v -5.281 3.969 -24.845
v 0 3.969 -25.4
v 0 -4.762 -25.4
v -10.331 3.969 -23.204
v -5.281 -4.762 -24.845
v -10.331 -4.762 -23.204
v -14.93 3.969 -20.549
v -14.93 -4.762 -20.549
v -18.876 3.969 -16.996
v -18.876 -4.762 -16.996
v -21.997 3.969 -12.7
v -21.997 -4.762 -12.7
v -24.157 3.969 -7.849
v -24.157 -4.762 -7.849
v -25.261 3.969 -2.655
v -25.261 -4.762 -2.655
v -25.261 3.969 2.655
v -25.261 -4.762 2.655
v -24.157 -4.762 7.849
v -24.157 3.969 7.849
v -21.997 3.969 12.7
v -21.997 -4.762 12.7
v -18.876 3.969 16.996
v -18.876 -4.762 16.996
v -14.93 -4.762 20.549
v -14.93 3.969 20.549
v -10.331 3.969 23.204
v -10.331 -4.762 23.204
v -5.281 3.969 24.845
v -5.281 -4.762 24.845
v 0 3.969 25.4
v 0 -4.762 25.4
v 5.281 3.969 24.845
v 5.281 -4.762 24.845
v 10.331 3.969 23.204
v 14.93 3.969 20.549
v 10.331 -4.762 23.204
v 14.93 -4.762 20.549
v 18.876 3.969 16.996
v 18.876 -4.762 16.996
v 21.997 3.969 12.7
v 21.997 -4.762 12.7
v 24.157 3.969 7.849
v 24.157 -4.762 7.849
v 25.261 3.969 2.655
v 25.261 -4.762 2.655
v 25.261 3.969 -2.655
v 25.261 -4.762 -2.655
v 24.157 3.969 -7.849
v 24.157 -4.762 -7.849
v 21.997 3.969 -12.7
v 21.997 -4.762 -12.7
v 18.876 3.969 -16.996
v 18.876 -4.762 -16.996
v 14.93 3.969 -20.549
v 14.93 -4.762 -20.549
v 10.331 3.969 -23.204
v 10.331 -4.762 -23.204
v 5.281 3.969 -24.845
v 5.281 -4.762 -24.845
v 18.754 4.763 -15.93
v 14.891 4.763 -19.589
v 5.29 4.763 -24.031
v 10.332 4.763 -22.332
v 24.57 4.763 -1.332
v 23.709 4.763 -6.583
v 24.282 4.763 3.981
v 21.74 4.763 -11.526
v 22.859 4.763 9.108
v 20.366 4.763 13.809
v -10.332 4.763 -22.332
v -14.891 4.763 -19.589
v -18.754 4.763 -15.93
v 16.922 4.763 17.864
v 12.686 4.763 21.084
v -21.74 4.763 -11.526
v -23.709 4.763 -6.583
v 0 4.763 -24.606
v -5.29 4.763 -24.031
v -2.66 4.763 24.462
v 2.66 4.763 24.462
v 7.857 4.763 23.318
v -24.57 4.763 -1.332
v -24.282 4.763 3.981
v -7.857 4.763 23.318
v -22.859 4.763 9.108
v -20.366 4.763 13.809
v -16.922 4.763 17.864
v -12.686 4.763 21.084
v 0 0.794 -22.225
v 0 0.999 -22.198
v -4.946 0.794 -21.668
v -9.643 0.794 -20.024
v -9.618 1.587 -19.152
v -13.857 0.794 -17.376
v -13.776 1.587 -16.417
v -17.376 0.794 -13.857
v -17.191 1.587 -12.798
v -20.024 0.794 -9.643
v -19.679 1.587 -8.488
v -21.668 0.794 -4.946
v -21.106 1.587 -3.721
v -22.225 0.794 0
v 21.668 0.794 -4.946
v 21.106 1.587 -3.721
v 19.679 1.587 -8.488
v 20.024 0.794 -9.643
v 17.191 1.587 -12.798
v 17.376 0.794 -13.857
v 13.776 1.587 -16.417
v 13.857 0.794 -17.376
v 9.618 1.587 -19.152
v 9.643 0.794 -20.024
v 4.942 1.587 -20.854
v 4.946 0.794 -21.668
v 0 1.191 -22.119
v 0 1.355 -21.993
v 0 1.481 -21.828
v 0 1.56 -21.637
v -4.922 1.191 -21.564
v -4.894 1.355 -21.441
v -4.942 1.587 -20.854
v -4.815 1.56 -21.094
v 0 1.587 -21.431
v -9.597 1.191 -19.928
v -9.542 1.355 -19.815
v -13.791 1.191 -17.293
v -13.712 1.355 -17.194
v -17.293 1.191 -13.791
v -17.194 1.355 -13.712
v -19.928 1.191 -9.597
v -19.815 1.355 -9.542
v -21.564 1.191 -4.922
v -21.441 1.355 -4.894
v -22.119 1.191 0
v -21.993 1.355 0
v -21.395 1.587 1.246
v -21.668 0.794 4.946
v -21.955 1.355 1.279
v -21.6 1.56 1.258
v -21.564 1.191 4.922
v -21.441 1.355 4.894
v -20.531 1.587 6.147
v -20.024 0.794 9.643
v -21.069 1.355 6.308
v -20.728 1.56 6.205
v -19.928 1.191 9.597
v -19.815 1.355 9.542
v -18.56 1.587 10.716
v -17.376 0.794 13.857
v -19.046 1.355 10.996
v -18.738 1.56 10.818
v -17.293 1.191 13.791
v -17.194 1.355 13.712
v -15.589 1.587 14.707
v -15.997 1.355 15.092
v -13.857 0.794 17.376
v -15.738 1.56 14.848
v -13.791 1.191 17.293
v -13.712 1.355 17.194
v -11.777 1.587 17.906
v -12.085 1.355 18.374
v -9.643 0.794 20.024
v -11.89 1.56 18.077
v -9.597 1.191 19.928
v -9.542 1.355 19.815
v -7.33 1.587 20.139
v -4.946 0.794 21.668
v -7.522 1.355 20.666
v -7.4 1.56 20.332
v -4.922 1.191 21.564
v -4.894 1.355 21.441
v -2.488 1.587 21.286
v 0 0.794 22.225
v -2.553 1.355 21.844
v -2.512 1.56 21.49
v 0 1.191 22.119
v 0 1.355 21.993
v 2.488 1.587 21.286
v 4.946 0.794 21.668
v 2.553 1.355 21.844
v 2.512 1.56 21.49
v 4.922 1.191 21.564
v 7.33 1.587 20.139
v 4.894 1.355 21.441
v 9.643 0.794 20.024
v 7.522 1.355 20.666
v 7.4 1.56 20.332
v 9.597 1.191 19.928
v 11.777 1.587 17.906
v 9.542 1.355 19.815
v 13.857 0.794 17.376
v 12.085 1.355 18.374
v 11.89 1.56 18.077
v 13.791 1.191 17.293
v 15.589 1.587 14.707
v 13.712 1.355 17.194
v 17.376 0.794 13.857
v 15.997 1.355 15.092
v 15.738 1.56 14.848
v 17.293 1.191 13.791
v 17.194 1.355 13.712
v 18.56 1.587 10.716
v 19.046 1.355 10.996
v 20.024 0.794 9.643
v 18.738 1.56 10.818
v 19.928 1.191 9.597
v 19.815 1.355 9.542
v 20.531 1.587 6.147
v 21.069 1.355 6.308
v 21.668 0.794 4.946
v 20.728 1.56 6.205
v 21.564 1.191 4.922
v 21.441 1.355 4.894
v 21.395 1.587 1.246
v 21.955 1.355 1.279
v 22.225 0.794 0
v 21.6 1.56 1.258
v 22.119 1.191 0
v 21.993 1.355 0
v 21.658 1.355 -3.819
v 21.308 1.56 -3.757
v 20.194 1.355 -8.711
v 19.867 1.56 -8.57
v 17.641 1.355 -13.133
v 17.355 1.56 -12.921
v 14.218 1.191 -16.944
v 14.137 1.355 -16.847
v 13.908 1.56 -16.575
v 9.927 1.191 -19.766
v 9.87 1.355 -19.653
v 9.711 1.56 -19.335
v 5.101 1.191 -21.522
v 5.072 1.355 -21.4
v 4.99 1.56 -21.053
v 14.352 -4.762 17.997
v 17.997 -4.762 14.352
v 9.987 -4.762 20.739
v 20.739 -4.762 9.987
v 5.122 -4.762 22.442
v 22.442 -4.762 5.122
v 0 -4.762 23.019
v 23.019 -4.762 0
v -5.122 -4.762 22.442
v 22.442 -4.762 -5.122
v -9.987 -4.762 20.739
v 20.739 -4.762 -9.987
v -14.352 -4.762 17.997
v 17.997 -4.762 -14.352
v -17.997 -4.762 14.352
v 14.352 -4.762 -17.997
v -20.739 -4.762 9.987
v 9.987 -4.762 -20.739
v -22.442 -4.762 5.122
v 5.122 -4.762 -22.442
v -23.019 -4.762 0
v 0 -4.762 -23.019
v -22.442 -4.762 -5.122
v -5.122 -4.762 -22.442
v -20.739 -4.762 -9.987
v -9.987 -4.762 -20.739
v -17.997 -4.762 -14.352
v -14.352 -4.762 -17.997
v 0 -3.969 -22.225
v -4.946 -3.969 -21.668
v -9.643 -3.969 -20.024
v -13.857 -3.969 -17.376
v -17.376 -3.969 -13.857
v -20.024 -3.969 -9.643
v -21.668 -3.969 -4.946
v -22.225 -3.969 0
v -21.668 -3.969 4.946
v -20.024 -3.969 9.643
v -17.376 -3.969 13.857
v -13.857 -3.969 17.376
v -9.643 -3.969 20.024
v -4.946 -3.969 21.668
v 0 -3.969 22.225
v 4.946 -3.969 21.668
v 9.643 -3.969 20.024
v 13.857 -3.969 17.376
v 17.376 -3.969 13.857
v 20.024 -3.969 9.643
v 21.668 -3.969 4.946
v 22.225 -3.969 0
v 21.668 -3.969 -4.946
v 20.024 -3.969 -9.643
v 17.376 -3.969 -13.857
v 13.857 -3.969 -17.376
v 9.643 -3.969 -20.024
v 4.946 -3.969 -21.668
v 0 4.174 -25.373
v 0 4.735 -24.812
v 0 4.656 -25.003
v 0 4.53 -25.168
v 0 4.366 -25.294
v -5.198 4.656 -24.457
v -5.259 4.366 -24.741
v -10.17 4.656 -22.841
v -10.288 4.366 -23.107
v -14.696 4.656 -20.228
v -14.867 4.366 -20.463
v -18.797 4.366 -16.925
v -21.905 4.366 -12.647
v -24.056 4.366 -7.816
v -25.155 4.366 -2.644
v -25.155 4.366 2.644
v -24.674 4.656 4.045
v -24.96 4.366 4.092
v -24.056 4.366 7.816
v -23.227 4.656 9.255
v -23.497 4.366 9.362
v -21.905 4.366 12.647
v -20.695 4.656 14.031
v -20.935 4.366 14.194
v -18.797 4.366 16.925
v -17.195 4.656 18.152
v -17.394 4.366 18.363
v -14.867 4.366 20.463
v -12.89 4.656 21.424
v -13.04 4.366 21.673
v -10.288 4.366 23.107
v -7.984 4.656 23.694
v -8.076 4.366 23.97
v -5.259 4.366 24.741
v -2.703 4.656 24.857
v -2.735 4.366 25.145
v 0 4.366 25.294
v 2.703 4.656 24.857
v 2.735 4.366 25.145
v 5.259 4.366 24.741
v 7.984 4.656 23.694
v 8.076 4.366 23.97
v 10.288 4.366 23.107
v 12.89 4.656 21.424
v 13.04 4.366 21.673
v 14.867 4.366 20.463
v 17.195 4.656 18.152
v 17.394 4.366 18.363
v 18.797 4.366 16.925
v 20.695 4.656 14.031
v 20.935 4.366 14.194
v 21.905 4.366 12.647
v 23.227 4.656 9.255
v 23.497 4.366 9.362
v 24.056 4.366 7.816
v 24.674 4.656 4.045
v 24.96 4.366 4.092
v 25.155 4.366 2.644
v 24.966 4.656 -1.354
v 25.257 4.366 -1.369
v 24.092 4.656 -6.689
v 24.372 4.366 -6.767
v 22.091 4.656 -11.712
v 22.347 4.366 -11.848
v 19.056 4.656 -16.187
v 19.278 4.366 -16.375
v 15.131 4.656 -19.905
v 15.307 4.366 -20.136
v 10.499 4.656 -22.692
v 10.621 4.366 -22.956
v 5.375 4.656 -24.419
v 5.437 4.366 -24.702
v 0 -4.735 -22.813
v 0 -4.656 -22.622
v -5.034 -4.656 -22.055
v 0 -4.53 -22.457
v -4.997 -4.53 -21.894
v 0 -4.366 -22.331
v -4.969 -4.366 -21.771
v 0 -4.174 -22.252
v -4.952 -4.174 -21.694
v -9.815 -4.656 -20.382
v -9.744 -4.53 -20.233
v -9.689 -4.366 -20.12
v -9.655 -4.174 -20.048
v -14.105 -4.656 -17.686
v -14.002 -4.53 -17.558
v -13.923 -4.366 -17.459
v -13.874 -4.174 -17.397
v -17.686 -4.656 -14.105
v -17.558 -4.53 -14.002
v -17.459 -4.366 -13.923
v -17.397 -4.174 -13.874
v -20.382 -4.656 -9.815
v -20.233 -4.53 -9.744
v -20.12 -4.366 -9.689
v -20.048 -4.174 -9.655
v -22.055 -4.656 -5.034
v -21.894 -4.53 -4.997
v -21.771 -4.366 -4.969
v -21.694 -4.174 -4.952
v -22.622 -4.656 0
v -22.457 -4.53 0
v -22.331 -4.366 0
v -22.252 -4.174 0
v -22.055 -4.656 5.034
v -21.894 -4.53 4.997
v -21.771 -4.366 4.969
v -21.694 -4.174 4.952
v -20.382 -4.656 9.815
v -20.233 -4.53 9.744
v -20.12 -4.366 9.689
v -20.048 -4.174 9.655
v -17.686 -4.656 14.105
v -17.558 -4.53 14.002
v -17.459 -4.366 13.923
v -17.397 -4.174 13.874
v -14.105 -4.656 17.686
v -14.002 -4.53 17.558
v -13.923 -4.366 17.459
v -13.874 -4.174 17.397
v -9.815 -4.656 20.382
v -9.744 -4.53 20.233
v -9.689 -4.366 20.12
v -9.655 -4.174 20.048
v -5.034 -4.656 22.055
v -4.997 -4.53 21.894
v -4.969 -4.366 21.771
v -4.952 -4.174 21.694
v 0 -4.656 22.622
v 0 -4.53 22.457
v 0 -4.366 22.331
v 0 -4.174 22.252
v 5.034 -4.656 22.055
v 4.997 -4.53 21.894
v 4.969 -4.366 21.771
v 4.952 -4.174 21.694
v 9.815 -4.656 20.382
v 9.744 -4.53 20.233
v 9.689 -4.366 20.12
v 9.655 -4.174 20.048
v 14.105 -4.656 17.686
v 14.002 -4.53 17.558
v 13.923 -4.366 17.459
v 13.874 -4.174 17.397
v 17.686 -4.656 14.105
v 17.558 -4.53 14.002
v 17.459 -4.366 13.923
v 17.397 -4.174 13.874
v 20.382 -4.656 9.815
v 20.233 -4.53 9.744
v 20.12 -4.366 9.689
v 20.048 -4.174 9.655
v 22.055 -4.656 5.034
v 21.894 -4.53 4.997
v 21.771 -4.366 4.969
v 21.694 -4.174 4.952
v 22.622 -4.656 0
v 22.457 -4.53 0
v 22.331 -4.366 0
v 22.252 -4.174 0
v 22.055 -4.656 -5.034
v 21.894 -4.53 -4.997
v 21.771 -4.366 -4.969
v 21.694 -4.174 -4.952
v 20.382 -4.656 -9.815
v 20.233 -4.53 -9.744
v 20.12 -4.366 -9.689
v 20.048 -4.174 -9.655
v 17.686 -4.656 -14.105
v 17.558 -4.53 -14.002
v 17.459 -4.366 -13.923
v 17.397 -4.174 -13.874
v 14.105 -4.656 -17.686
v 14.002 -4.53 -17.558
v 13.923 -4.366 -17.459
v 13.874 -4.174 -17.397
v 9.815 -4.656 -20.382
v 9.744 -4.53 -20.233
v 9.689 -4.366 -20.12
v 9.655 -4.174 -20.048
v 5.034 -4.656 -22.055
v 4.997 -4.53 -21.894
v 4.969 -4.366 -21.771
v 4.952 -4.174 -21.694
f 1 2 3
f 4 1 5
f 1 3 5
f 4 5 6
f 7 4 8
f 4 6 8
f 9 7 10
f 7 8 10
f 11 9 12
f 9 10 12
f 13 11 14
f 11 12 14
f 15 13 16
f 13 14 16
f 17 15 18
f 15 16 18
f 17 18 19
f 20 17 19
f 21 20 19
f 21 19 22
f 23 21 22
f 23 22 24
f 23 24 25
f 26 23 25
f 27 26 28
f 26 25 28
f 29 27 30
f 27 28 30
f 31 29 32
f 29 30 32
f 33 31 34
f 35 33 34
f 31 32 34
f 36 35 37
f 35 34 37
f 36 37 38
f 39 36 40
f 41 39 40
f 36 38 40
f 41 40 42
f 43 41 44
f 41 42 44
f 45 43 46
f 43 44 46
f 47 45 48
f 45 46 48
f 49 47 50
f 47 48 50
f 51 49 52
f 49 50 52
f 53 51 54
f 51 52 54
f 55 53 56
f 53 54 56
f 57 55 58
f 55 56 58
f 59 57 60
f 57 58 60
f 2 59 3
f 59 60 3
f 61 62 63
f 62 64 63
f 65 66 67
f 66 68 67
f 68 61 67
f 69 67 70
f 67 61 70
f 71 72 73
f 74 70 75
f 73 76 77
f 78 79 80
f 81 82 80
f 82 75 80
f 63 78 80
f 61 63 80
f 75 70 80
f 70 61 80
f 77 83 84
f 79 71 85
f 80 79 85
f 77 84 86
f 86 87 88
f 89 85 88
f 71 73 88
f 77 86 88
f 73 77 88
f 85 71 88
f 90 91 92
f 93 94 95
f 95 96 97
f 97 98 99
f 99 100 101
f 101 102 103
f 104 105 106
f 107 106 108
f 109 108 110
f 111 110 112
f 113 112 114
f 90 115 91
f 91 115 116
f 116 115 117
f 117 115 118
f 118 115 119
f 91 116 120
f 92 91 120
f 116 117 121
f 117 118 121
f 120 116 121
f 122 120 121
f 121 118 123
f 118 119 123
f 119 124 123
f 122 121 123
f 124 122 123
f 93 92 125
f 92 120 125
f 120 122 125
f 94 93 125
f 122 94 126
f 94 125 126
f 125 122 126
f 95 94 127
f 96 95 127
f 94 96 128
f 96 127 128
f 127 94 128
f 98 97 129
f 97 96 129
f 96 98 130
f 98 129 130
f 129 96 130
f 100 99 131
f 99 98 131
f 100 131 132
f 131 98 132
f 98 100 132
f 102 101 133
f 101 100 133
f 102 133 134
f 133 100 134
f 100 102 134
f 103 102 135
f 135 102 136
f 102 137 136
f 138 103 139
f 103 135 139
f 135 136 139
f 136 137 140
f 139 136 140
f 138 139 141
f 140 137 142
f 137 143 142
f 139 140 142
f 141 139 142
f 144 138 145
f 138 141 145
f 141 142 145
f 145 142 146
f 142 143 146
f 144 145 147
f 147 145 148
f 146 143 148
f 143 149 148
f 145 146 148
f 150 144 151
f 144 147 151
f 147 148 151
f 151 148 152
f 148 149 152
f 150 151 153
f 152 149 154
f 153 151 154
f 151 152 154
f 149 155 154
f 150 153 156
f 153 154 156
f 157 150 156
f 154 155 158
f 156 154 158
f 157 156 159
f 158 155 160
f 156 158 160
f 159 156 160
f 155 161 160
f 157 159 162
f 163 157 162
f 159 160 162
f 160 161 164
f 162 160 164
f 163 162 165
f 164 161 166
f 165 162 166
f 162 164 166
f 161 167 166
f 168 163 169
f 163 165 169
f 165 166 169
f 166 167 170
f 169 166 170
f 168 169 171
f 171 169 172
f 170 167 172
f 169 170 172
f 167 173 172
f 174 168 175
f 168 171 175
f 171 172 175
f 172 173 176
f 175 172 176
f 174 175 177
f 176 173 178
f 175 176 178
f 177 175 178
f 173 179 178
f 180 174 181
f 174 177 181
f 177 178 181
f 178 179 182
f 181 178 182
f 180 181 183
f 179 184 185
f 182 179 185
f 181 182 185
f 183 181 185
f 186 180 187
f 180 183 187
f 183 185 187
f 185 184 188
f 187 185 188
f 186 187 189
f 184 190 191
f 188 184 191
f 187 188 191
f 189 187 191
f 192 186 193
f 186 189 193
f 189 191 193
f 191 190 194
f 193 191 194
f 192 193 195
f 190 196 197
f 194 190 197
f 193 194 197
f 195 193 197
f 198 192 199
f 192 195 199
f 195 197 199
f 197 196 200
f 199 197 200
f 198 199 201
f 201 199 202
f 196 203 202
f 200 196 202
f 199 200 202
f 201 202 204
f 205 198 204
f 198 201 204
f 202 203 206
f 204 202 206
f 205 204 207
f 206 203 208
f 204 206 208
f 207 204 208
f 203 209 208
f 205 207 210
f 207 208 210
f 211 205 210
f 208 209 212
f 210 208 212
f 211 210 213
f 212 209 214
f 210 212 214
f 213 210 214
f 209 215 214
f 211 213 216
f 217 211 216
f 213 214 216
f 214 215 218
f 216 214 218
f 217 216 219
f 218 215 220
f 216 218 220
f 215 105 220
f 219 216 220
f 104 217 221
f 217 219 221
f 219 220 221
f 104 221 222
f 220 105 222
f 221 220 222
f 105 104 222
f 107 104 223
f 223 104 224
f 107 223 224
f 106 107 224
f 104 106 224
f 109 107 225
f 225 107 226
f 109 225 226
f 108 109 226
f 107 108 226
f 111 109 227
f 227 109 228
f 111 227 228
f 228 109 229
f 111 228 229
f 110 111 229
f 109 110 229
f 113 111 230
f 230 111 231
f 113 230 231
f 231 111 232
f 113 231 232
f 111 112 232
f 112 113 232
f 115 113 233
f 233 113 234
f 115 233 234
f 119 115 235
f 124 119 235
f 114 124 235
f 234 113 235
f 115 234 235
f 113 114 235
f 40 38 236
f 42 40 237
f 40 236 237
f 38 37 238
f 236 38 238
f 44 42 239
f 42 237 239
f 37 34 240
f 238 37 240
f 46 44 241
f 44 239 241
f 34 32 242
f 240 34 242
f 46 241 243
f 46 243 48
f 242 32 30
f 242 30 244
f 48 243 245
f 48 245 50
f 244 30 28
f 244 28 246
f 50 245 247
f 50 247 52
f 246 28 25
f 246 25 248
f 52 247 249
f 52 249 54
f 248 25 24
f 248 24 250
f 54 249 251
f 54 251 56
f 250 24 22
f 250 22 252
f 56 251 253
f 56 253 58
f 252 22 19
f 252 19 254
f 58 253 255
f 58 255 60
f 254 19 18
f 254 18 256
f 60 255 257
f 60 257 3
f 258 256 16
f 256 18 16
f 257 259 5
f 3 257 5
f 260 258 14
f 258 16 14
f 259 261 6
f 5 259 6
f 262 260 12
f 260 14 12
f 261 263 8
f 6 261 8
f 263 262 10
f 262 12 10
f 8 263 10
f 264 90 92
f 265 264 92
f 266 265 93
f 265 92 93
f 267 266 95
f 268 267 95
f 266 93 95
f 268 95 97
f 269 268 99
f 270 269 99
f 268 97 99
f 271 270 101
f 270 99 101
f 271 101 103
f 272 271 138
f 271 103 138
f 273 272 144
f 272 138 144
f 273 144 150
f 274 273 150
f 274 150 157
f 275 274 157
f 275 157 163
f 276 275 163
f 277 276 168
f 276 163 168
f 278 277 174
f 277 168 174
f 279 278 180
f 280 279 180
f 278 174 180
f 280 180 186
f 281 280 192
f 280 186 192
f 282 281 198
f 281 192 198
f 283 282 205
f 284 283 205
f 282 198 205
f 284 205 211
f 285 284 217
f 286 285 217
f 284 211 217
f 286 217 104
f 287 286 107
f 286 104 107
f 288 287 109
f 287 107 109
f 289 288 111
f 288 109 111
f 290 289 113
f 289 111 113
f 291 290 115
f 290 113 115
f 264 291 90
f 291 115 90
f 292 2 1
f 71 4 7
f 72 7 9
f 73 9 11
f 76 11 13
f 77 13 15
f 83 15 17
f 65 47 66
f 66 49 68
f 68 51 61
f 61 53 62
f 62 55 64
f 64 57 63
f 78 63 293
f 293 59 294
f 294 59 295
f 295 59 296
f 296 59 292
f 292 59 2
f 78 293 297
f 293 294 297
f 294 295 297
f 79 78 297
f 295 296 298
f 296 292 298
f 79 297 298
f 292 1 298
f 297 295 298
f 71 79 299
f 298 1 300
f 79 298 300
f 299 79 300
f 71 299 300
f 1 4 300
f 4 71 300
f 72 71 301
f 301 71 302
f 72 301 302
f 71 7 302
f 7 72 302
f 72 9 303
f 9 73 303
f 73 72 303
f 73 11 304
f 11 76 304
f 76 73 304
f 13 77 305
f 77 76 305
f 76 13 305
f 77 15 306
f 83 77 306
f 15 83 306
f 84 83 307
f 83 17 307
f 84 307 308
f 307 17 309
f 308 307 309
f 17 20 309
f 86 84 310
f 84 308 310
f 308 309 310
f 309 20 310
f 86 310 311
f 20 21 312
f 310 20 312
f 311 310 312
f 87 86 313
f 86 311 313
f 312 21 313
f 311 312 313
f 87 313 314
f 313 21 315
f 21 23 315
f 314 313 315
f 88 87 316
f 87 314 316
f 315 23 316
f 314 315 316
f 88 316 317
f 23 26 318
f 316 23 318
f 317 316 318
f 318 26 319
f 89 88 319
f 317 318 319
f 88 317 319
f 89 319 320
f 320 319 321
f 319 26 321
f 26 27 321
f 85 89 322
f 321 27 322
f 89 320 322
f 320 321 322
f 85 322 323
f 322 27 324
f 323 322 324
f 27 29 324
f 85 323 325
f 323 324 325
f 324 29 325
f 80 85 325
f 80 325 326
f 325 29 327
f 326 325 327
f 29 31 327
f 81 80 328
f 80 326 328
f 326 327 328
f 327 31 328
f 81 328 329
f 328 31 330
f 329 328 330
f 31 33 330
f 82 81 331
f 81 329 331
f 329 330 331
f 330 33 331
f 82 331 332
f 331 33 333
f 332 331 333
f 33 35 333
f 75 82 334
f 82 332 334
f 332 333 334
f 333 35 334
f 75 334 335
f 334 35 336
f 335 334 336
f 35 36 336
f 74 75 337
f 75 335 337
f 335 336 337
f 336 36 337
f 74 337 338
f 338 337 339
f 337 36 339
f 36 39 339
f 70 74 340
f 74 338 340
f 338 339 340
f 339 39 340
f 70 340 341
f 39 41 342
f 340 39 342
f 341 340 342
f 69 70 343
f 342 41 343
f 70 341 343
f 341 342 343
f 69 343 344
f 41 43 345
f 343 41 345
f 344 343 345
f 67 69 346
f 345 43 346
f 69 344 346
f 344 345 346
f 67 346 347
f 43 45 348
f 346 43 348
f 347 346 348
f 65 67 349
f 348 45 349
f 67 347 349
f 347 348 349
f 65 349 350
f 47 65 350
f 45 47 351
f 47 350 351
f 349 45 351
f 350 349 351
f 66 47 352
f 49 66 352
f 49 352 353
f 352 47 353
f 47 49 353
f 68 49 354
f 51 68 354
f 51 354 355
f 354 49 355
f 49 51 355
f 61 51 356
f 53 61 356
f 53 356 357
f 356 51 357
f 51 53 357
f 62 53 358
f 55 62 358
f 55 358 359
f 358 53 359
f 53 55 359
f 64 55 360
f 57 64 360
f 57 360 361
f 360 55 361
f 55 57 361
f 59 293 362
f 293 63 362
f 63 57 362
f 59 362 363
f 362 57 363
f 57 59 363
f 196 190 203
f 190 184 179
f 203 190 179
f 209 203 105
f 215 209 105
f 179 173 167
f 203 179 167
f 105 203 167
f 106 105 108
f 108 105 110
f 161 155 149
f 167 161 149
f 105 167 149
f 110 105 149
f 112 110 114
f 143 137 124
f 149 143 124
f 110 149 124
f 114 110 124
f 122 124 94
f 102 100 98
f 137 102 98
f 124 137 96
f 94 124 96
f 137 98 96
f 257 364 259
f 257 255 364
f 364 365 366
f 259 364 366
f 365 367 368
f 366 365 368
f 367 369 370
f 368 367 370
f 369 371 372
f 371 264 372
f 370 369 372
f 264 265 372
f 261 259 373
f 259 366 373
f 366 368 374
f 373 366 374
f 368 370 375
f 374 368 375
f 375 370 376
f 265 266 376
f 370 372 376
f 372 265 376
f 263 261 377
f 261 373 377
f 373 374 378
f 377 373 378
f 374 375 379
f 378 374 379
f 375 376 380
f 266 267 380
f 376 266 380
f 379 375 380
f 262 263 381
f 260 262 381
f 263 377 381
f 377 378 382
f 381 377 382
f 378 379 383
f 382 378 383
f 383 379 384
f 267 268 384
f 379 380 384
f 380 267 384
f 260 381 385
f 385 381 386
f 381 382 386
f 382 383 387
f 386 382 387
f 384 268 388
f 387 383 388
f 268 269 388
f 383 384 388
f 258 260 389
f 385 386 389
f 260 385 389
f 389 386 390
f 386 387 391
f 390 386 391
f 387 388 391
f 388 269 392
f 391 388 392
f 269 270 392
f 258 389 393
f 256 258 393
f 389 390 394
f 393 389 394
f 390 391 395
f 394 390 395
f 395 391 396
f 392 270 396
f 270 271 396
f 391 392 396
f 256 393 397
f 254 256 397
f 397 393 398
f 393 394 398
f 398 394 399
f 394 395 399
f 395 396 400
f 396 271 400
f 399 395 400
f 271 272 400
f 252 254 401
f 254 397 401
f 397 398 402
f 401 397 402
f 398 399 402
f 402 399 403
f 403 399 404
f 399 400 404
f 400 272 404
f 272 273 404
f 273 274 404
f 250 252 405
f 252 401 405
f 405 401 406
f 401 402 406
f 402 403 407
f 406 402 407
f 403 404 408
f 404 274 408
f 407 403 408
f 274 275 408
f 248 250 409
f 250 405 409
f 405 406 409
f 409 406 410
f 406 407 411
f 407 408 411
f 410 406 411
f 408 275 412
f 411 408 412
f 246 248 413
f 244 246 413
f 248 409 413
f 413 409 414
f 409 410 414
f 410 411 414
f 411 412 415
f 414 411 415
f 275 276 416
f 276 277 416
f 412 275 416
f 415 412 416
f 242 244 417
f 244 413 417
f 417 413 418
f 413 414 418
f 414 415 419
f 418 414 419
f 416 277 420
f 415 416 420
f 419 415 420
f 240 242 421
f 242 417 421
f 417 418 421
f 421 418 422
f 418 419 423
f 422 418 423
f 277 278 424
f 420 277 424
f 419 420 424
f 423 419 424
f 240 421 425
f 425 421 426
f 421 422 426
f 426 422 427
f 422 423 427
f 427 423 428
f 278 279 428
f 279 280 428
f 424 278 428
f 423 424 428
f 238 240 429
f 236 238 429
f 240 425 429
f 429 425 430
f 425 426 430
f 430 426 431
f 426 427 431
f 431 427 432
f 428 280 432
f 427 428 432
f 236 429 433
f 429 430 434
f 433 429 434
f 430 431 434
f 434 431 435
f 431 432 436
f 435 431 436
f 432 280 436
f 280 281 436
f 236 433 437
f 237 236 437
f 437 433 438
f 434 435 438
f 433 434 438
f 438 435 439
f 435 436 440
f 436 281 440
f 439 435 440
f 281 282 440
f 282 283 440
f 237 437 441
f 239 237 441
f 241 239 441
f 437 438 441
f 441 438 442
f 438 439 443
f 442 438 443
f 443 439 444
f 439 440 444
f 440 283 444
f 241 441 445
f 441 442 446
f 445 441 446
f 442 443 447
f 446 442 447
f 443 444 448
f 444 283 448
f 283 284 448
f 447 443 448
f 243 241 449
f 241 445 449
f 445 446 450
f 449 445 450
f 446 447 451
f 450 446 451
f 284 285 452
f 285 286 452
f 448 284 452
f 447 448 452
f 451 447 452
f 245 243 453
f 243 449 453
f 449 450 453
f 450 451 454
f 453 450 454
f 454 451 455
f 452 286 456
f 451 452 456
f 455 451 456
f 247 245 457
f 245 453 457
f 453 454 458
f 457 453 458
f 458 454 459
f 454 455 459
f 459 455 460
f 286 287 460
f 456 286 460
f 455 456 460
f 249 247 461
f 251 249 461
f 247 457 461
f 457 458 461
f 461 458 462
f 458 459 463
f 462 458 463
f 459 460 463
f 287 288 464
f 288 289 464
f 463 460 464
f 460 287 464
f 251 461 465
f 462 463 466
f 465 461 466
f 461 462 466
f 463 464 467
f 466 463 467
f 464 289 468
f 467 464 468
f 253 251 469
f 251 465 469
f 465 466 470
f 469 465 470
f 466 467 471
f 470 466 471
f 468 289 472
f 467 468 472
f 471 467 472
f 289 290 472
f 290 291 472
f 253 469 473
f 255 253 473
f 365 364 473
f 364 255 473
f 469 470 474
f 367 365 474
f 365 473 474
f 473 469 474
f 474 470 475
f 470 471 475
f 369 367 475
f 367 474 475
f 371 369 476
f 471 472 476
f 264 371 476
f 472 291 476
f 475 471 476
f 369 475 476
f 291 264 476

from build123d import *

# Parameters (mm, degrees)
FILLET1_R = 0.79375


with BuildPart() as part:
    # Sketch1 → Revolve1 (revolve)
    with BuildSketch(Plane(origin=(0, 0, 0), x_dir=(0, 0, -1), z_dir=(1, 0, 0))):
        Polygon((0, 4.7625), (25.4, 4.7625), (25.4, -4.7625), (22.225, -4.7625), (22.225, 1.5875), (0, 1.5875), align=None)
    revolve(axis=Axis((0, -32.325211936, 0), (0, 1, 0)))

    # Fillet1
    fillet1_edges = [part.edges().sort_by_distance(p)[0] for p in [
        (0, 1.5875, 22.225),
        (0, -4.7625, 22.225),
        (0, 4.7625, 25.4),
    ]]
    fillet(fillet1_edges, radius=FILLET1_R)


solid = part.part
